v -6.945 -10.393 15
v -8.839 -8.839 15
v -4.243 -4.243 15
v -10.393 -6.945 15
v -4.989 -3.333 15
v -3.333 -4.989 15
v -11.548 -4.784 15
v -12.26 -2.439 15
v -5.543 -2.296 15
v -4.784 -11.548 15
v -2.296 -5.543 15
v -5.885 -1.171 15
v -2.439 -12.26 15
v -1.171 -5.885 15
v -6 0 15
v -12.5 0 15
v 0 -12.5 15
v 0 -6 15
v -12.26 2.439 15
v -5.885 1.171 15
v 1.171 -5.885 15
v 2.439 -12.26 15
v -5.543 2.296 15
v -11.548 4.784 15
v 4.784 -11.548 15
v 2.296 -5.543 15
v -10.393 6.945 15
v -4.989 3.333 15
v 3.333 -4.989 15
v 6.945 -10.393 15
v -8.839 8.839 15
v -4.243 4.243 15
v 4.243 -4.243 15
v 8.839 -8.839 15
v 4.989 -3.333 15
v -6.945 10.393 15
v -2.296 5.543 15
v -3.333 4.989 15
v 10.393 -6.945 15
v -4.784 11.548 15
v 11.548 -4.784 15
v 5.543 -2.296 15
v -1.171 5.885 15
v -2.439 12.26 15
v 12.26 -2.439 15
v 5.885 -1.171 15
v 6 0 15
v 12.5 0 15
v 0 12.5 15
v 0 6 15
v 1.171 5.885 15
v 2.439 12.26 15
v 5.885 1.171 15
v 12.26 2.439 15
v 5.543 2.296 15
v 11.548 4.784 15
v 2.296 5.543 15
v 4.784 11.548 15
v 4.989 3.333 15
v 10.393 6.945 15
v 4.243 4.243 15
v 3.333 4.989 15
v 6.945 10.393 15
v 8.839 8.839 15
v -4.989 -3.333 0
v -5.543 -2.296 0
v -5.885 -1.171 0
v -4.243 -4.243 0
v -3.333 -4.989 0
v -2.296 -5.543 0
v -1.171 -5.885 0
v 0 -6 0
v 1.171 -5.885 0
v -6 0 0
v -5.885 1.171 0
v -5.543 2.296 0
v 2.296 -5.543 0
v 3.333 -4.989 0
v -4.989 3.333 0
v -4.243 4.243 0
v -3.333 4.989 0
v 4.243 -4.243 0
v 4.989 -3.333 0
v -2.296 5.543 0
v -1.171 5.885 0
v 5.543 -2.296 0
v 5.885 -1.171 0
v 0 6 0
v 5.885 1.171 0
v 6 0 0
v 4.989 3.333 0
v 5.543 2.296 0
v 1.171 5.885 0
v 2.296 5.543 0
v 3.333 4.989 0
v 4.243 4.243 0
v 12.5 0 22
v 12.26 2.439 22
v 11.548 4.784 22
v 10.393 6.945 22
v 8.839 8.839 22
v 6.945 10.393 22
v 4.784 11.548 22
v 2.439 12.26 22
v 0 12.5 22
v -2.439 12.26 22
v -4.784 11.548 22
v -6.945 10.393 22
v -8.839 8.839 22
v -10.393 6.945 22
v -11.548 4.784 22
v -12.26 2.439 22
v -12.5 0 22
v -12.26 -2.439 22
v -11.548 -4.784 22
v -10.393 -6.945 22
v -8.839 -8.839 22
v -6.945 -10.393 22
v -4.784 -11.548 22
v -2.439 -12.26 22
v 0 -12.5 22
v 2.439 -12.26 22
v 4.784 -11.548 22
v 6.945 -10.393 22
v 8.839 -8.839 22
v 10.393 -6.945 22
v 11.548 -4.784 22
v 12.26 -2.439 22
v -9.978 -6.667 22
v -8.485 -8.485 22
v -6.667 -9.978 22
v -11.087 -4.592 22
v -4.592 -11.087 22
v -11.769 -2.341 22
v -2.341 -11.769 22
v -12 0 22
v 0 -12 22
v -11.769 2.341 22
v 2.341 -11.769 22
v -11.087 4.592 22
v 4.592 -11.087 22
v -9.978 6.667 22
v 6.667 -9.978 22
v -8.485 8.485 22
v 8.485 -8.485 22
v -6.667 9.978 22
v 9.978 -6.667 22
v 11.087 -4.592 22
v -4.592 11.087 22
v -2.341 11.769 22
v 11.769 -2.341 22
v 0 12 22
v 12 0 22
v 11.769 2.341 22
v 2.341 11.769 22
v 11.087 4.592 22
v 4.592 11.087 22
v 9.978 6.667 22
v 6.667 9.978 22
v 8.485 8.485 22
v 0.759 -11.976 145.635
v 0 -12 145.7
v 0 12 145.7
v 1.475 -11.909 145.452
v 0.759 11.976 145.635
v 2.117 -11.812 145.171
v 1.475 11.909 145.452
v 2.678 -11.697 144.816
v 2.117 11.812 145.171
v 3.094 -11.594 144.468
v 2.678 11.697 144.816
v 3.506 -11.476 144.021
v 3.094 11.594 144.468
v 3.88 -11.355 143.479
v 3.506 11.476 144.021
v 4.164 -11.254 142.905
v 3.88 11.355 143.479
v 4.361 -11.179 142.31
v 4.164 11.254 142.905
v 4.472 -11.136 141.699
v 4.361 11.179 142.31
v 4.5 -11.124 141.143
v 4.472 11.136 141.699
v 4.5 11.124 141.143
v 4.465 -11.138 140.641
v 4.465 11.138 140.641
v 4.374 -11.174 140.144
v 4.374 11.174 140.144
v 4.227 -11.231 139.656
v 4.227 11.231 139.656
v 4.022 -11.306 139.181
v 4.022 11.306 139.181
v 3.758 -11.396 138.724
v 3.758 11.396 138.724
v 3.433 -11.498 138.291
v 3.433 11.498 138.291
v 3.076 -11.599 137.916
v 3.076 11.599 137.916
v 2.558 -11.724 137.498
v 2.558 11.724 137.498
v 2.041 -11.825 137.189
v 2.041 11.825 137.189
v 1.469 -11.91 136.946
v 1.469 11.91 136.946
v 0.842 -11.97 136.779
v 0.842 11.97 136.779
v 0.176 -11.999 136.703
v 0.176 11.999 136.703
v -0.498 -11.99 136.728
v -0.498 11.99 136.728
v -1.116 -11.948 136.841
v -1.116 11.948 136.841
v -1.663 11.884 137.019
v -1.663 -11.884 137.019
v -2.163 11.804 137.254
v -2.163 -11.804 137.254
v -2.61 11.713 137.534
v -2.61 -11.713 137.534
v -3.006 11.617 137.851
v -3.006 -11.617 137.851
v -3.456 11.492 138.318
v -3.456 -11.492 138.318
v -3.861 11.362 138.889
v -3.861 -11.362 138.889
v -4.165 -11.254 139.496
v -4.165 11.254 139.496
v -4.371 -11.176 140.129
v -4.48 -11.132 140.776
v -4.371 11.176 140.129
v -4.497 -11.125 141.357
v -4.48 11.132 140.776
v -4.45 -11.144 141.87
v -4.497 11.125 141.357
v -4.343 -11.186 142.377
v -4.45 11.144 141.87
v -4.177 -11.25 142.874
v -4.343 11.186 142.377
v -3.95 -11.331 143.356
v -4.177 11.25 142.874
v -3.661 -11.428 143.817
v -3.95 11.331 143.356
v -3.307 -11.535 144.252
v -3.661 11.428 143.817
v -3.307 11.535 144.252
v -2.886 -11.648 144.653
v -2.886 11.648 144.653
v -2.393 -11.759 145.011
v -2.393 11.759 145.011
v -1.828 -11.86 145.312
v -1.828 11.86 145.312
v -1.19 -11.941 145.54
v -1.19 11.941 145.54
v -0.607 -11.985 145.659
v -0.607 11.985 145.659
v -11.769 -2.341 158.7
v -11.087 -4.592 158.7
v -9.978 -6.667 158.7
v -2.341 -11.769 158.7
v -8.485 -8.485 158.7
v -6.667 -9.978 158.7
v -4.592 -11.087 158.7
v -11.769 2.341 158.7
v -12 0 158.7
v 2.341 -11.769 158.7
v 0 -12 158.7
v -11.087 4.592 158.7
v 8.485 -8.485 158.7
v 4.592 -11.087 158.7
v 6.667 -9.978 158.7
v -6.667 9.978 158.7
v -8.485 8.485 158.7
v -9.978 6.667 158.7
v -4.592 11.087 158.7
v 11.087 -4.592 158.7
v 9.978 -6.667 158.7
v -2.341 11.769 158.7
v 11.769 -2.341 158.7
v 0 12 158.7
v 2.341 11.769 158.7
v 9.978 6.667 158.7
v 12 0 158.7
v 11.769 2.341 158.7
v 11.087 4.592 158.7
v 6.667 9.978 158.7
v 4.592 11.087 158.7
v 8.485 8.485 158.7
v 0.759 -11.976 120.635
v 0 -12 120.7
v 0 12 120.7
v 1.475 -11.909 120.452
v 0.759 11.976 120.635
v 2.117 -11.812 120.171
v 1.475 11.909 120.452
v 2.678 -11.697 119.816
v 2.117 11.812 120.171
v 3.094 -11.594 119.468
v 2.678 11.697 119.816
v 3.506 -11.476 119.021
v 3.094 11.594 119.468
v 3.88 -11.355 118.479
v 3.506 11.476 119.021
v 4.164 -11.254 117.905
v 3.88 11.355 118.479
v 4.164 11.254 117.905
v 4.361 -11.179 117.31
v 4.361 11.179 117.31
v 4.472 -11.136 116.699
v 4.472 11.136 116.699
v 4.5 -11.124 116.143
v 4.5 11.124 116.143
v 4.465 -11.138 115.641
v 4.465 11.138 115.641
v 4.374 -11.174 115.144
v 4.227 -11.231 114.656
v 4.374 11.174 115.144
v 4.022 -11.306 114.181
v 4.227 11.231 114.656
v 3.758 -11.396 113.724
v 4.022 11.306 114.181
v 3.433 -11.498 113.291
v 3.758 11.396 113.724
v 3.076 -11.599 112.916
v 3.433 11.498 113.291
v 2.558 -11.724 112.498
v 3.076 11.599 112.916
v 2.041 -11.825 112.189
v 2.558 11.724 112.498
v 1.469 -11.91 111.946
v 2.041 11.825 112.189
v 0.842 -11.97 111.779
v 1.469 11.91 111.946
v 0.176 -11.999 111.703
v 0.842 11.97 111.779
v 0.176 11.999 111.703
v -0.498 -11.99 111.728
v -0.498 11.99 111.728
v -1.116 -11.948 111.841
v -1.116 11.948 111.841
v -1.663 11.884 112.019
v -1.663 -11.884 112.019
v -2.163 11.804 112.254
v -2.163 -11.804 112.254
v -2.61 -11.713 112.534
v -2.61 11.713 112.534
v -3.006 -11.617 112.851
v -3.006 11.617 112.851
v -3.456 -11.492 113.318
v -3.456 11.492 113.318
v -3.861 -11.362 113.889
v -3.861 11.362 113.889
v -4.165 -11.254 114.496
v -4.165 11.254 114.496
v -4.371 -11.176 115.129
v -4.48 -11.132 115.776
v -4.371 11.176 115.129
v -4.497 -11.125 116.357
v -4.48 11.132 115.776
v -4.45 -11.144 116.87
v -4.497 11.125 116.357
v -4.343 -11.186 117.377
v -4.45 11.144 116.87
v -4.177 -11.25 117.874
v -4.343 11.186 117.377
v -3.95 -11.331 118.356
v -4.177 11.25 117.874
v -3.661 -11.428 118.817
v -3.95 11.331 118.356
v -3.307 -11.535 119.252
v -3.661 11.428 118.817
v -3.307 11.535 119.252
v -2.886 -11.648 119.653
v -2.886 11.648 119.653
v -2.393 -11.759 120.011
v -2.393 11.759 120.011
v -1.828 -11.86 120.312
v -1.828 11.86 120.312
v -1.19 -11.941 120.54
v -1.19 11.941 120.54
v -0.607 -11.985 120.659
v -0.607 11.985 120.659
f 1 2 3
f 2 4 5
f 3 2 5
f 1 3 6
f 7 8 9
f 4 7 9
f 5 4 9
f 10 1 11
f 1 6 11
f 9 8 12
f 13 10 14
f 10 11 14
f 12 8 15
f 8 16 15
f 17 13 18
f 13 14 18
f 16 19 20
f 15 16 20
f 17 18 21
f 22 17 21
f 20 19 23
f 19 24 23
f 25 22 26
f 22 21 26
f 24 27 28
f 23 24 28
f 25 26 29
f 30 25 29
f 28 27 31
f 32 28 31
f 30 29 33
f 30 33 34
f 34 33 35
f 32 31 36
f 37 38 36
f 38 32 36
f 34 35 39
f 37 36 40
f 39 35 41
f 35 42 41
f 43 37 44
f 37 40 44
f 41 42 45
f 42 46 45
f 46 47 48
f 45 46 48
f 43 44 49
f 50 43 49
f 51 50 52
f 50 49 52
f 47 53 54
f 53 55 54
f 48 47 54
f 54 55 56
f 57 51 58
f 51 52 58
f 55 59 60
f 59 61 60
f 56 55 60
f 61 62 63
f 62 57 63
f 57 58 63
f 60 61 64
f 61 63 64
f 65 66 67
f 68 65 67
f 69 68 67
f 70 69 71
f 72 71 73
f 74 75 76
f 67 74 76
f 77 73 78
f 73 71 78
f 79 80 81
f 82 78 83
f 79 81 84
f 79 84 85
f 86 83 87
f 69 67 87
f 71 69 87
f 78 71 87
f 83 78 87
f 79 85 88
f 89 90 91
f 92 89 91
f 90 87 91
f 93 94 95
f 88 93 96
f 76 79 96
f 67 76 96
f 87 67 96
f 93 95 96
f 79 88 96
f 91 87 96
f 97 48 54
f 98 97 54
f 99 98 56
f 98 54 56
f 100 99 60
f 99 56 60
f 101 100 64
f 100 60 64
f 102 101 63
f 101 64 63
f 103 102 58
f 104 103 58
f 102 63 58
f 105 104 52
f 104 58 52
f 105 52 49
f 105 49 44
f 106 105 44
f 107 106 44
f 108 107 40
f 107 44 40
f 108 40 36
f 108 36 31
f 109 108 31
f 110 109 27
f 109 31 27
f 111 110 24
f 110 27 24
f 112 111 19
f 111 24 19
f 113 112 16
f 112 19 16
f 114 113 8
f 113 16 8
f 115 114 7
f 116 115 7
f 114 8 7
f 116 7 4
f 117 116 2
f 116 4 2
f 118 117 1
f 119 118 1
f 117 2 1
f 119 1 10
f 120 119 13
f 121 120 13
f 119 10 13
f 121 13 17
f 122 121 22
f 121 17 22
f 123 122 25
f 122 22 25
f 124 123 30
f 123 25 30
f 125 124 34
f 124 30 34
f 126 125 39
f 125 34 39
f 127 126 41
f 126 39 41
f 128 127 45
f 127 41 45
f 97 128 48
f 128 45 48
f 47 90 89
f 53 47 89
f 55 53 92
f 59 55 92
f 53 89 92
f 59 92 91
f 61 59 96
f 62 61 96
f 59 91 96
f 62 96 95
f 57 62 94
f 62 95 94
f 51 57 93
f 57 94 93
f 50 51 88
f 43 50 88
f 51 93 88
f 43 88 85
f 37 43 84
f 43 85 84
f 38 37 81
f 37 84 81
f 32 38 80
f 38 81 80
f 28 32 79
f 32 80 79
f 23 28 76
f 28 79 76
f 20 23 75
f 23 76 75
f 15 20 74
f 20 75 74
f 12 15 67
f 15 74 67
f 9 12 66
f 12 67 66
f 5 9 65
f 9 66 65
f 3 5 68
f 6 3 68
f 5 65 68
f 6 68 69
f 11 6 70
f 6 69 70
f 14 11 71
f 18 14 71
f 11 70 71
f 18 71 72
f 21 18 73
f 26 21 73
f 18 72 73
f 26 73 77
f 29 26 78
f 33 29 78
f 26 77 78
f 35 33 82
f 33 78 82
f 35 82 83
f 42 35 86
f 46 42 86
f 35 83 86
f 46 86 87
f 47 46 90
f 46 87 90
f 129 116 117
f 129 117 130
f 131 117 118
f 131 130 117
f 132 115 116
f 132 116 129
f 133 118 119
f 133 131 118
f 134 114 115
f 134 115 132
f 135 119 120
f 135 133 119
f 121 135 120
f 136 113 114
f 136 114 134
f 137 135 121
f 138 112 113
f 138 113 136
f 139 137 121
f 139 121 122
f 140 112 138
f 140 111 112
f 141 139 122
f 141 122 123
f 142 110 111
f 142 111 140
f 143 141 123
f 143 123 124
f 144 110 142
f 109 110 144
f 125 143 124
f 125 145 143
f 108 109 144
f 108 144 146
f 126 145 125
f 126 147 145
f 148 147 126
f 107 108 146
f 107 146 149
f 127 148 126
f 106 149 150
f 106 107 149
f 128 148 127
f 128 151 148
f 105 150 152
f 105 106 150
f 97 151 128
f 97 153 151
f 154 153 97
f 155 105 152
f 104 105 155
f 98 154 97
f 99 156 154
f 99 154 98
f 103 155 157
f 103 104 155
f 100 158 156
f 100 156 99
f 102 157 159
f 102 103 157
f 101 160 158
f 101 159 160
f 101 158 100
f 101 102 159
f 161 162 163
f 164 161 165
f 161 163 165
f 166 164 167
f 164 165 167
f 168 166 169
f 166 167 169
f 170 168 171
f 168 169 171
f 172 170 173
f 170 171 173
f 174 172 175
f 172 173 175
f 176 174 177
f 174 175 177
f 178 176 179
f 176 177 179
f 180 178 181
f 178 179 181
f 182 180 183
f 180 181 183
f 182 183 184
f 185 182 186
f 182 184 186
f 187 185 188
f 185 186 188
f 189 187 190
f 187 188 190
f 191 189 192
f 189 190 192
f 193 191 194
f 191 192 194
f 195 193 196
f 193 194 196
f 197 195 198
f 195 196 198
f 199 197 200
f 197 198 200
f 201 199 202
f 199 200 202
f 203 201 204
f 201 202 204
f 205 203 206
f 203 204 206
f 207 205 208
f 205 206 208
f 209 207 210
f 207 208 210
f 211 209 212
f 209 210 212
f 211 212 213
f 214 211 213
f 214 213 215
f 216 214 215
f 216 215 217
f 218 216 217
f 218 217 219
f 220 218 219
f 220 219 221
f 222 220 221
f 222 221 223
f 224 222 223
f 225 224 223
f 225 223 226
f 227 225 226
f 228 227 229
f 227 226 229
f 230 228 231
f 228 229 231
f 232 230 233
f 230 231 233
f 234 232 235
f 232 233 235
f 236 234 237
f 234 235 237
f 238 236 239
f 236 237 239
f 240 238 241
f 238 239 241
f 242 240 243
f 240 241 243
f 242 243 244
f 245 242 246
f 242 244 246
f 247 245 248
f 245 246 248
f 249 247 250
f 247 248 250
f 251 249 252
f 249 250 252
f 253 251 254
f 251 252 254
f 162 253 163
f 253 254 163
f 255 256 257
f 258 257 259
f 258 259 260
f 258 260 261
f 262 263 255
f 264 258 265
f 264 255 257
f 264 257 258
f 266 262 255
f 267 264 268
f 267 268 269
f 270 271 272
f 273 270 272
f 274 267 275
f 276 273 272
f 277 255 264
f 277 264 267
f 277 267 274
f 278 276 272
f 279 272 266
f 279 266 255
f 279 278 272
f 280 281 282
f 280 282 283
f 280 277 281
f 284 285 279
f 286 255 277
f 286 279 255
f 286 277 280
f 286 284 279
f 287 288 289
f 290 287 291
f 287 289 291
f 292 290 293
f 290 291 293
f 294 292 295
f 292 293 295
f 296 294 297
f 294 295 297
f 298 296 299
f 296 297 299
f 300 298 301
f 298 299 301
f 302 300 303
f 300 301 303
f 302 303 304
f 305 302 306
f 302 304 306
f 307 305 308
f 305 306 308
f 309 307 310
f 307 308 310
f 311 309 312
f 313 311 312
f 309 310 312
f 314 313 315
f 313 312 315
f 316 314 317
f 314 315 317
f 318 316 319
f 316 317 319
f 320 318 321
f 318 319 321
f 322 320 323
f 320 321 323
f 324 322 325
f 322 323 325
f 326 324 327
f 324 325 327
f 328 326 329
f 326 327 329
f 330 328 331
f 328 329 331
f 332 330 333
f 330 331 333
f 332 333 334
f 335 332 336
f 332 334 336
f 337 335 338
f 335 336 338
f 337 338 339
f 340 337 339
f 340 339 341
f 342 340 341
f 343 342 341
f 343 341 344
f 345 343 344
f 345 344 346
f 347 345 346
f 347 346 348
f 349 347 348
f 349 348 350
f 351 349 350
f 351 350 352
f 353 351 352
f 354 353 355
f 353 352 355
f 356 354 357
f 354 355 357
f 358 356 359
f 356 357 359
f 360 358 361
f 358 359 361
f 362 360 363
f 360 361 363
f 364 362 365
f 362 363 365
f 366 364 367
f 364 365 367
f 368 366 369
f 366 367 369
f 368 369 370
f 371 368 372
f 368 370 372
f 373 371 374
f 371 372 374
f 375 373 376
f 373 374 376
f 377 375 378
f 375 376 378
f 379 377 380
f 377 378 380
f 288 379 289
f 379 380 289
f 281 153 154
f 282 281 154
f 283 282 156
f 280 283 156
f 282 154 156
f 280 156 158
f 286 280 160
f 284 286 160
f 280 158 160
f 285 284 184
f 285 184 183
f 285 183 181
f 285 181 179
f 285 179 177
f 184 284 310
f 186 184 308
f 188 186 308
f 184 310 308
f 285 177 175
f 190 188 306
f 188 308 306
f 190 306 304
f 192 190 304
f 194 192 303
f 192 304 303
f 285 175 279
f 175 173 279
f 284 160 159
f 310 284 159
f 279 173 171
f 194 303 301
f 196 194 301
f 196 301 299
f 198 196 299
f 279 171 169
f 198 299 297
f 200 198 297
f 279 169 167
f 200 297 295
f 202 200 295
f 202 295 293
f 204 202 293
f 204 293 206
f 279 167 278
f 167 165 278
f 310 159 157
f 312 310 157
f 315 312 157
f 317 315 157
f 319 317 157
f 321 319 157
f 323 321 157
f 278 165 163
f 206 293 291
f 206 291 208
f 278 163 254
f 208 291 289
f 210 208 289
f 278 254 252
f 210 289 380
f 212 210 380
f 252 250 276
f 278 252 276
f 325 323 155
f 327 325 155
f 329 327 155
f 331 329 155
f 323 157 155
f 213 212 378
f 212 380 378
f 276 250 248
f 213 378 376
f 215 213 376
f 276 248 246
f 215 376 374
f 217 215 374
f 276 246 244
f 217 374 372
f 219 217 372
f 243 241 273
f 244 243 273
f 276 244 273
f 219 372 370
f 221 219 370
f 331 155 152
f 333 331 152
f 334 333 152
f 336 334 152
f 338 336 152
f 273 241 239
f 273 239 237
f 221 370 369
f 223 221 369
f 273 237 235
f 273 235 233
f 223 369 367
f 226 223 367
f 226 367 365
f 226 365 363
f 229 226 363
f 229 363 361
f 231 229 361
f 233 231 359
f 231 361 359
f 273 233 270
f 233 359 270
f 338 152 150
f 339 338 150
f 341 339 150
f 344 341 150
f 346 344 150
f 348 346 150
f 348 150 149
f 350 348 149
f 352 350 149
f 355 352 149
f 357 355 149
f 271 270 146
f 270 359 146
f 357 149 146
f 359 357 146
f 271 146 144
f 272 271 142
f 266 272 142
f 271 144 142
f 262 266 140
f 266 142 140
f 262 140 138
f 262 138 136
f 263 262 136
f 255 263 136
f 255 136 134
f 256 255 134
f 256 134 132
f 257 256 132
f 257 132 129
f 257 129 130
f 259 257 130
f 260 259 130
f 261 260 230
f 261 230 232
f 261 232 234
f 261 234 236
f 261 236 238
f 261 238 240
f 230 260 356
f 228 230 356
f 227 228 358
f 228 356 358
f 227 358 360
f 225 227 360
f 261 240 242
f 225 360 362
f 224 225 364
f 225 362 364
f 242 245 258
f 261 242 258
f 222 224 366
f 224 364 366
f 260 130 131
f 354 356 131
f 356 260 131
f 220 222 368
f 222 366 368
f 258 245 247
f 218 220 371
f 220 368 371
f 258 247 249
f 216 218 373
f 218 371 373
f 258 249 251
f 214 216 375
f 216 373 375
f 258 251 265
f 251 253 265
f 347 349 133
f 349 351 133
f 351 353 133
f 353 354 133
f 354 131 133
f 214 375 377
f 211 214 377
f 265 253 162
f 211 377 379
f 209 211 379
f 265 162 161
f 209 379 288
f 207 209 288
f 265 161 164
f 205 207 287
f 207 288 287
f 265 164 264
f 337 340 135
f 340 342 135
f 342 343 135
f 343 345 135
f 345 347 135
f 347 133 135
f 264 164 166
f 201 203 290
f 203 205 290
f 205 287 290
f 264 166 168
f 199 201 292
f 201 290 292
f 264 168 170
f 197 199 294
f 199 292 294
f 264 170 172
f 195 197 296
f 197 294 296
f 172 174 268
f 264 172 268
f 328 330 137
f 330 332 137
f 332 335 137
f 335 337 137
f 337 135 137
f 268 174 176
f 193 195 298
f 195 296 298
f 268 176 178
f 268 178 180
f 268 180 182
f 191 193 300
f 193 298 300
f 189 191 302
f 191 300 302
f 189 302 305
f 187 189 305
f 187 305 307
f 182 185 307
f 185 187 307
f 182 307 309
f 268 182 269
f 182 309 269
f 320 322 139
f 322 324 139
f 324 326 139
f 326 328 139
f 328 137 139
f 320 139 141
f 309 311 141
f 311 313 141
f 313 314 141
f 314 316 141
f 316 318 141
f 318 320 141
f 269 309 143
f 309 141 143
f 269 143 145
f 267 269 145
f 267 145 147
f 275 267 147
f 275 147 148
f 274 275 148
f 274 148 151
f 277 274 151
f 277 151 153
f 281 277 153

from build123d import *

# Parameters (mm, degrees)
SKETCH1_R           = 6
BOSS_EXTRUDE1_DEPTH = 15
SKETCH2_R           = 12.5
BOSS_EXTRUDE2_DEPTH = 7
SKETCH3_R           = 12
BOSS_EXTRUDE3_DEPTH = 136.7
SKETCH4_R           = 4.5
CUT_EXTRUDE1_DEPTH  = 160.681526796
LPATTERN1_COUNT     = 2
LPATTERN1_PITCH     = 25


with BuildPart() as part:
    # Sketch1 → Boss-Extrude1 (new body)
    with BuildSketch(Plane.XY):
        Circle(SKETCH1_R)
    extrude(amount=BOSS_EXTRUDE1_DEPTH)

    # Sketch2 → Boss-Extrude2 (add)
    with BuildSketch(Plane.XY.offset(15)):
        Circle(SKETCH2_R)
    extrude(amount=BOSS_EXTRUDE2_DEPTH)

    # Sketch3 → Boss-Extrude3 (add)
    with BuildSketch(Plane.XY.offset(22)):
        Circle(SKETCH3_R)
    extrude(amount=BOSS_EXTRUDE3_DEPTH)

    # Sketch4 → Cut-Extrude1 (cut, symmetric)
    with BuildSketch(Plane(origin=(0, 0, 0), x_dir=(1, 0, 0), z_dir=(0, 1, 0))):
        with Locations(Location((0, -141.2, 0), (0, 0, 270))):
            Circle(SKETCH4_R)
    cut_extrude1 = extrude(amount=CUT_EXTRUDE1_DEPTH, both=True, mode=Mode.SUBTRACT)

    # LPattern1: Cut-Extrude1 ×2
    with Locations(*[(0, 0, -i * LPATTERN1_PITCH) for i in range(1, LPATTERN1_COUNT)]):
        add(cut_extrude1, mode=Mode.SUBTRACT)


solid = part.part
